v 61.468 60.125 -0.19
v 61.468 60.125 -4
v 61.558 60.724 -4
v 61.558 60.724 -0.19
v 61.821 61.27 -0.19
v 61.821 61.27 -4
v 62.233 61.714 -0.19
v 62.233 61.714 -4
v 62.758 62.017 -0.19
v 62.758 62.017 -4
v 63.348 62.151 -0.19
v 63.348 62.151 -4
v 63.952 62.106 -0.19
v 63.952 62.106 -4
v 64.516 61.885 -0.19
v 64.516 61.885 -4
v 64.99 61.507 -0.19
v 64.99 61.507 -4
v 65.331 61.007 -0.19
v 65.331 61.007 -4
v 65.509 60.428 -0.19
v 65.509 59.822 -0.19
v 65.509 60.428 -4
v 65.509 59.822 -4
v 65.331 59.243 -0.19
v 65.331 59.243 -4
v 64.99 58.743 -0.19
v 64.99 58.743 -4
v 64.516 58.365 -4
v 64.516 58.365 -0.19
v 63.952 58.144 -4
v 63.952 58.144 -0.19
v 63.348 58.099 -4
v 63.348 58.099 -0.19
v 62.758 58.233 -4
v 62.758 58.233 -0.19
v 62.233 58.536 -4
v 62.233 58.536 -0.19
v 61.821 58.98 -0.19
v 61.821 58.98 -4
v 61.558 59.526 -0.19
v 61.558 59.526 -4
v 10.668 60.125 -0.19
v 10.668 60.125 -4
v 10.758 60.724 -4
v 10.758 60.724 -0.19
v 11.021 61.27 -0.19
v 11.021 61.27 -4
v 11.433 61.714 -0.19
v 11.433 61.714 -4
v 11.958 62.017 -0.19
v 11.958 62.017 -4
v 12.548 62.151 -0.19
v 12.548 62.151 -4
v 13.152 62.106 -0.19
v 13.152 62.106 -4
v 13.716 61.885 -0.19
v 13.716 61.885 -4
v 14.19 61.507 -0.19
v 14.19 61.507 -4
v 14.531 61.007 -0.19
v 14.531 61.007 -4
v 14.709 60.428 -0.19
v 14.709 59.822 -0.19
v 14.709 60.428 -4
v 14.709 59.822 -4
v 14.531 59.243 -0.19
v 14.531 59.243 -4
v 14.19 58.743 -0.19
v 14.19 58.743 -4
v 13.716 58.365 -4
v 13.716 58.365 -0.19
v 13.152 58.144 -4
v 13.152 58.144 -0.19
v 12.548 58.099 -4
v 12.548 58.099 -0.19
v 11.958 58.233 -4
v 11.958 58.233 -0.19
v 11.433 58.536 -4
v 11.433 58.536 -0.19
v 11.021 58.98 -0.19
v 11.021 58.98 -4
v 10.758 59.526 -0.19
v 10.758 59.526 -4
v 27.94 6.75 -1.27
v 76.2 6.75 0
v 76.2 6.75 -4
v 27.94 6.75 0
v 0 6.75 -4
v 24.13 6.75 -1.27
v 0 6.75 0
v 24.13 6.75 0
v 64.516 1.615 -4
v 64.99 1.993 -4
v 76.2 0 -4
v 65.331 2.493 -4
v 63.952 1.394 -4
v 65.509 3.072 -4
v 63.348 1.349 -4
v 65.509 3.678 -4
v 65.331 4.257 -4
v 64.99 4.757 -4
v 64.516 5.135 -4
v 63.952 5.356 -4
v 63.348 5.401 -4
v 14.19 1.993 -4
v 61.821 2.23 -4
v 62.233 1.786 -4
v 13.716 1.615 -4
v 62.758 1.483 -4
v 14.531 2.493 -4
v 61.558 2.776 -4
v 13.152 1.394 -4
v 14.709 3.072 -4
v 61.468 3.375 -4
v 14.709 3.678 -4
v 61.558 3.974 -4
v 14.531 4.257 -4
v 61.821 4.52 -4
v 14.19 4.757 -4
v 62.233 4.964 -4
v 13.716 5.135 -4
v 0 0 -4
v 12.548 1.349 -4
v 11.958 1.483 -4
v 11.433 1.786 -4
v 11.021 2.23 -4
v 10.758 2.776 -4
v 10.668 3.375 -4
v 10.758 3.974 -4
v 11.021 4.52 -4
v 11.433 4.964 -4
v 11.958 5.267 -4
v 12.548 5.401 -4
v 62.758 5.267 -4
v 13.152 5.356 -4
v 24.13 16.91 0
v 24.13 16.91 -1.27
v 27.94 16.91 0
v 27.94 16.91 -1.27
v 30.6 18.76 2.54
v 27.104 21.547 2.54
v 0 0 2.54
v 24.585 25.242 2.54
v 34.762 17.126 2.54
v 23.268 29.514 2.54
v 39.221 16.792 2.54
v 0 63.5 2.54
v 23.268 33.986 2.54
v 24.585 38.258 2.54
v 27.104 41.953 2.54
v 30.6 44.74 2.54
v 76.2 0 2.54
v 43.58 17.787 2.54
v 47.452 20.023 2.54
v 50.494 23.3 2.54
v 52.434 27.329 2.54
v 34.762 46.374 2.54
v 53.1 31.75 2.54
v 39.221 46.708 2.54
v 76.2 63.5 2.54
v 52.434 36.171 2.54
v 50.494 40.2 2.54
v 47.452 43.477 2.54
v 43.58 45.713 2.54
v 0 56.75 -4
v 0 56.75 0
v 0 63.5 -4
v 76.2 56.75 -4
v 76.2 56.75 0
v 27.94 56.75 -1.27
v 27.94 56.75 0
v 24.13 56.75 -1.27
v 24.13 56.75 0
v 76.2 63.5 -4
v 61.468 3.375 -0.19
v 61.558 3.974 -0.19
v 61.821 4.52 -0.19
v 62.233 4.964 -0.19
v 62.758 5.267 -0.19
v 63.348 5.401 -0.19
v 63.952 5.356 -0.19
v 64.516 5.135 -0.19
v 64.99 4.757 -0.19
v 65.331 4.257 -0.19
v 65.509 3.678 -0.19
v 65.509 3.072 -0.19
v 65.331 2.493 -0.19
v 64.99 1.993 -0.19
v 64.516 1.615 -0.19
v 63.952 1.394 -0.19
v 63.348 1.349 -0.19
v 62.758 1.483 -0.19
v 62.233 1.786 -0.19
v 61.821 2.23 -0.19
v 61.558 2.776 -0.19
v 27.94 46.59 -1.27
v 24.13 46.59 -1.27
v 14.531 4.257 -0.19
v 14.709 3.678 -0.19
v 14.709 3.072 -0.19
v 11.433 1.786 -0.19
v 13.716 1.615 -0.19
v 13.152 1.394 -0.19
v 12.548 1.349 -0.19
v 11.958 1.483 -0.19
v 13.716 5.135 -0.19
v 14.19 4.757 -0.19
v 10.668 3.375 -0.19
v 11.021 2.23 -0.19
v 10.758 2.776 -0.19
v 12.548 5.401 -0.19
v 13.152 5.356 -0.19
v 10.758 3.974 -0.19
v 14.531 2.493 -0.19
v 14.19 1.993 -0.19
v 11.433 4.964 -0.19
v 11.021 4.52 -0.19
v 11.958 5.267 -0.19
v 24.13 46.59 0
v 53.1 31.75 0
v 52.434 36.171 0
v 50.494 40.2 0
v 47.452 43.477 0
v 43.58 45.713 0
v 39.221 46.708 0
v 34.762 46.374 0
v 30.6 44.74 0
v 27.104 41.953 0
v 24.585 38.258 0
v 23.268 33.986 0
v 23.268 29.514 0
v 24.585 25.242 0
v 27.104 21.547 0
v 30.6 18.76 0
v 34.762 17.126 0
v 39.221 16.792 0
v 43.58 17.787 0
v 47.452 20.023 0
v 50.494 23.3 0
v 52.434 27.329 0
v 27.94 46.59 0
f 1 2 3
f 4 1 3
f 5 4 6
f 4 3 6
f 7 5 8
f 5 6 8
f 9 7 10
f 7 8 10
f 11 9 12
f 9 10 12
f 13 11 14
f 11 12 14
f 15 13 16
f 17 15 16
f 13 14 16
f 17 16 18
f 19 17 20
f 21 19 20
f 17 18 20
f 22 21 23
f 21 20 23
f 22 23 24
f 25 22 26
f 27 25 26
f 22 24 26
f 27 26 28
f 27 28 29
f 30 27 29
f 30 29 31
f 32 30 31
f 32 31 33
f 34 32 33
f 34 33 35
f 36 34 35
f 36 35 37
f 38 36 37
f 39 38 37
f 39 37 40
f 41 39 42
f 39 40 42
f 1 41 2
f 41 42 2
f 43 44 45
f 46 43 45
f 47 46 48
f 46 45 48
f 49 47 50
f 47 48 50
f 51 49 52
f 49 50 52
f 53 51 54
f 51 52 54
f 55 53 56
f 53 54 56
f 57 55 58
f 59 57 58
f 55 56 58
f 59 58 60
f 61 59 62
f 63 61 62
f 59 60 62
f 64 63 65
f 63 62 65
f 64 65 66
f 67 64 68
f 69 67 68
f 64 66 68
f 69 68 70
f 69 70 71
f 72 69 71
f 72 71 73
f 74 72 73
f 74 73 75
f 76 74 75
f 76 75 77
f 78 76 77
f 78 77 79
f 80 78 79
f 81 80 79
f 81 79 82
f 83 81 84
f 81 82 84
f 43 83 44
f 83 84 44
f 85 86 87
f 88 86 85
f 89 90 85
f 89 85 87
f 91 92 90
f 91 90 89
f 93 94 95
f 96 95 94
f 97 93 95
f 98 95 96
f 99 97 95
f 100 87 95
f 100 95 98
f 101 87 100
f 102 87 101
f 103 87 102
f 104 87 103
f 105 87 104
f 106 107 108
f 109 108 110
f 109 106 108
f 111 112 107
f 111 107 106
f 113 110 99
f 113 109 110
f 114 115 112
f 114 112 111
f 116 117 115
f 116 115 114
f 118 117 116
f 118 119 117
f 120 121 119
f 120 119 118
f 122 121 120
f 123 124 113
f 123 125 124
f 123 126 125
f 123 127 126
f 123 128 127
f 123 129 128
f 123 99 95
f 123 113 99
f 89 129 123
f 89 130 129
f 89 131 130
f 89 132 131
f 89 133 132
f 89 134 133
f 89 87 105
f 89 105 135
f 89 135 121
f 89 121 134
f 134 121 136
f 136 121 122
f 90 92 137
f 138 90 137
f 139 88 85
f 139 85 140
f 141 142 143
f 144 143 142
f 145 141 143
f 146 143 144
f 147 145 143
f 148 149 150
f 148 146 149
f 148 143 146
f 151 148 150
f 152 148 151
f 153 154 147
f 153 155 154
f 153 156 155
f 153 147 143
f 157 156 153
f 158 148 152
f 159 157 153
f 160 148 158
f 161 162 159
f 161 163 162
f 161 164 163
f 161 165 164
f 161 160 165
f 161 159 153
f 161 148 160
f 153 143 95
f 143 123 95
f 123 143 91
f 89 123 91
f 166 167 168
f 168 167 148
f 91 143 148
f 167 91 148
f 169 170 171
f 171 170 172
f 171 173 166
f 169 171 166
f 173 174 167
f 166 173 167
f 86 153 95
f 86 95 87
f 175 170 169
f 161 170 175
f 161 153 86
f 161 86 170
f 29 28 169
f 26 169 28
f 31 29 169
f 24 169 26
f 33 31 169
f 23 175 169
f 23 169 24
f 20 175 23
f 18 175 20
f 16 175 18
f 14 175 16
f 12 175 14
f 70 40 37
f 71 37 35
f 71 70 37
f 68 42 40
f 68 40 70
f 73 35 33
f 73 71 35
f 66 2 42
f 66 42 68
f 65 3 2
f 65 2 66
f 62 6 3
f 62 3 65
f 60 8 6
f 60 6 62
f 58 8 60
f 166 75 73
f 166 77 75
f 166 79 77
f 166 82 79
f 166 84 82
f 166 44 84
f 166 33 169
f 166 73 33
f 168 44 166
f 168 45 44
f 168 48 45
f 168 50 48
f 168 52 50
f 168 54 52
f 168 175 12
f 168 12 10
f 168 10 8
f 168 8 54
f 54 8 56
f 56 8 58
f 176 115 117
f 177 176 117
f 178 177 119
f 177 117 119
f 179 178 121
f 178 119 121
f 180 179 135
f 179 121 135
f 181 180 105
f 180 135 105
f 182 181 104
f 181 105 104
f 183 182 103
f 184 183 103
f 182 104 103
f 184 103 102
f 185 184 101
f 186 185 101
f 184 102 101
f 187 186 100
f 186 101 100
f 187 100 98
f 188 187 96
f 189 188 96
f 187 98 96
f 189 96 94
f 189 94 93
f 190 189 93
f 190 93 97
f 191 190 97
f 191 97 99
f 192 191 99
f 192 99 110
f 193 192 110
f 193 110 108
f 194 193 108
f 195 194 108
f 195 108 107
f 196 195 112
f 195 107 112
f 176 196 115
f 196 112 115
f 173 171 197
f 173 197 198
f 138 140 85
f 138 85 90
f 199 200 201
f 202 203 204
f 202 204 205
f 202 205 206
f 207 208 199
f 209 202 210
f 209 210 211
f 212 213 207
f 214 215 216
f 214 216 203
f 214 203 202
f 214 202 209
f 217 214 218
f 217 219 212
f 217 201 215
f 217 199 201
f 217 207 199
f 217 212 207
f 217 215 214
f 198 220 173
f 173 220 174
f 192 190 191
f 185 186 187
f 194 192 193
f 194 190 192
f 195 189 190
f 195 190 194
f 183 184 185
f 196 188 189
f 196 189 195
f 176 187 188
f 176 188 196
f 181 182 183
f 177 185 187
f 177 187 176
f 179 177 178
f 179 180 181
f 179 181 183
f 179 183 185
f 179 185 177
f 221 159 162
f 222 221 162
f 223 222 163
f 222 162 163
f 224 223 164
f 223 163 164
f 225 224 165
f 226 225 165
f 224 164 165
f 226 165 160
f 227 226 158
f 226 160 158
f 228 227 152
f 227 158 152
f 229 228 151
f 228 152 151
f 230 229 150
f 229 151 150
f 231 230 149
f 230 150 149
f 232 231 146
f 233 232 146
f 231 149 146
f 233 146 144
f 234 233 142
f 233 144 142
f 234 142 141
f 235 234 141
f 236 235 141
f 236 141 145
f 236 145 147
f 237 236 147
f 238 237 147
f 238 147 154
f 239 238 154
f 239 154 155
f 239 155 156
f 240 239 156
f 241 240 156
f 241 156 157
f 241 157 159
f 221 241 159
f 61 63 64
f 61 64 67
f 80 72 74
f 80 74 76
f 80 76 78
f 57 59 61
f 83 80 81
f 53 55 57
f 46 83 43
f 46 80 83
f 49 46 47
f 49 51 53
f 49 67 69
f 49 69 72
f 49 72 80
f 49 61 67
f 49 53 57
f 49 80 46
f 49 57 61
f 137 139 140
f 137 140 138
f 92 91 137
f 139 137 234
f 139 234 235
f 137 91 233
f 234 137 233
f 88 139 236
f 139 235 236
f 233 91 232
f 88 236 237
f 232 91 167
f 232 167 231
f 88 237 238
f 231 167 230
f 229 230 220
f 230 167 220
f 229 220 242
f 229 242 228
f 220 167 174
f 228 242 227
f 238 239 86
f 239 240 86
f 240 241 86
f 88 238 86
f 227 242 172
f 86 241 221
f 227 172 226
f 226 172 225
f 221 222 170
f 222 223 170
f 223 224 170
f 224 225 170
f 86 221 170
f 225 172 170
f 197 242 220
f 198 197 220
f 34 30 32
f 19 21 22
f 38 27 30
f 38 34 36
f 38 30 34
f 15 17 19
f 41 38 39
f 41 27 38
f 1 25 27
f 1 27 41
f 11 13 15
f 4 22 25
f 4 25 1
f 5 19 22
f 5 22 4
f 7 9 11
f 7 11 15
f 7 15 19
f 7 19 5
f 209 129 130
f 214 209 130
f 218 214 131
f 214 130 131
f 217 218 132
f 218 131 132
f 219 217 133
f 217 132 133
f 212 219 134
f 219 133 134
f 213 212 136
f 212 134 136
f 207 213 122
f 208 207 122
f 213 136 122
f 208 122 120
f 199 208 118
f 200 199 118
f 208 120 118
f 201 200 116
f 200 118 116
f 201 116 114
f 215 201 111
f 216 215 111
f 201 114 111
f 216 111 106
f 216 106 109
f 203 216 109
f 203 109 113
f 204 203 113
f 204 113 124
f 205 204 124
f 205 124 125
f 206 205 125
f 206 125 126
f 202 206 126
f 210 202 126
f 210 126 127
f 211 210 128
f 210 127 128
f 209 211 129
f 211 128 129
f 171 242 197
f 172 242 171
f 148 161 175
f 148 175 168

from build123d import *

# Parameters (mm, degrees)
SKETCH1_W           = 76.2
SKETCH1_H           = 63.5
BOSS_EXTRUDE1_DEPTH = 2.54
SKETCH2_W           = 76.2
SKETCH2_H           = 6.75
BOSS_EXTRUDE2_DEPTH = 4
SKETCH3_R           = 2.032
CUT_EXTRUDE1_DEPTH  = 3.81
SKETCH4_R           = 15
CUT_EXTRUDE2_DEPTH  = 10
SKETCH5_W           = 3.81
SKETCH5_H           = 10.16
BOSS_EXTRUDE3_DEPTH = 1.27


with BuildPart() as part:
    # Sketch1 → Boss-Extrude1 (new body)
    with BuildSketch(Plane.XY):
        with Locations((38.1, 31.75)):
            Rectangle(SKETCH1_W, SKETCH1_H)
    extrude(amount=BOSS_EXTRUDE1_DEPTH)

    # Sketch2 → Boss-Extrude2 (add)
    with BuildSketch(Plane(origin=(0, 0, 0), x_dir=(-1, 0, 0), z_dir=(0, 0, -1))):
        with Locations((-38.1, 60.125)):
            Rectangle(SKETCH2_W, SKETCH2_H)
        with Locations((-38.1, 3.375)):
            Rectangle(SKETCH2_W, SKETCH2_H)
    extrude(amount=BOSS_EXTRUDE2_DEPTH)

    # Sketch3 → Cut-Extrude1 (cut)
    with BuildSketch(Plane(origin=(0, 0, -4), x_dir=(-1, 0, 0), z_dir=(0, 0, -1))):
        with Locations((-63.5, 60.125)):
            Circle(SKETCH3_R)
        with Locations((-63.5, 3.375)):
            Circle(SKETCH3_R)
        with Locations((-12.7, 3.375)):
            Circle(SKETCH3_R)
        with Locations((-12.7, 60.125)):
            Circle(SKETCH3_R)
    extrude(amount=-CUT_EXTRUDE1_DEPTH, mode=Mode.SUBTRACT)

    # Sketch4 → Cut-Extrude2 (cut)
    with BuildSketch(Plane.XY.offset(2.54)):
        with Locations((38.1, 31.75)):
            Circle(SKETCH4_R)
    extrude(amount=-CUT_EXTRUDE2_DEPTH, mode=Mode.SUBTRACT)

    # Sketch5 → Boss-Extrude3 (add)
    with BuildSketch(Plane(origin=(0, 0, 0), x_dir=(-1, 0, 0), z_dir=(0, 0, -1))):
        with Locations((-26.035, 51.67)):
            Rectangle(SKETCH5_W, SKETCH5_H)
        with Locations((-26.035, 11.83)):
            Rectangle(SKETCH5_W, SKETCH5_H)
    extrude(amount=BOSS_EXTRUDE3_DEPTH)


solid = part.part
